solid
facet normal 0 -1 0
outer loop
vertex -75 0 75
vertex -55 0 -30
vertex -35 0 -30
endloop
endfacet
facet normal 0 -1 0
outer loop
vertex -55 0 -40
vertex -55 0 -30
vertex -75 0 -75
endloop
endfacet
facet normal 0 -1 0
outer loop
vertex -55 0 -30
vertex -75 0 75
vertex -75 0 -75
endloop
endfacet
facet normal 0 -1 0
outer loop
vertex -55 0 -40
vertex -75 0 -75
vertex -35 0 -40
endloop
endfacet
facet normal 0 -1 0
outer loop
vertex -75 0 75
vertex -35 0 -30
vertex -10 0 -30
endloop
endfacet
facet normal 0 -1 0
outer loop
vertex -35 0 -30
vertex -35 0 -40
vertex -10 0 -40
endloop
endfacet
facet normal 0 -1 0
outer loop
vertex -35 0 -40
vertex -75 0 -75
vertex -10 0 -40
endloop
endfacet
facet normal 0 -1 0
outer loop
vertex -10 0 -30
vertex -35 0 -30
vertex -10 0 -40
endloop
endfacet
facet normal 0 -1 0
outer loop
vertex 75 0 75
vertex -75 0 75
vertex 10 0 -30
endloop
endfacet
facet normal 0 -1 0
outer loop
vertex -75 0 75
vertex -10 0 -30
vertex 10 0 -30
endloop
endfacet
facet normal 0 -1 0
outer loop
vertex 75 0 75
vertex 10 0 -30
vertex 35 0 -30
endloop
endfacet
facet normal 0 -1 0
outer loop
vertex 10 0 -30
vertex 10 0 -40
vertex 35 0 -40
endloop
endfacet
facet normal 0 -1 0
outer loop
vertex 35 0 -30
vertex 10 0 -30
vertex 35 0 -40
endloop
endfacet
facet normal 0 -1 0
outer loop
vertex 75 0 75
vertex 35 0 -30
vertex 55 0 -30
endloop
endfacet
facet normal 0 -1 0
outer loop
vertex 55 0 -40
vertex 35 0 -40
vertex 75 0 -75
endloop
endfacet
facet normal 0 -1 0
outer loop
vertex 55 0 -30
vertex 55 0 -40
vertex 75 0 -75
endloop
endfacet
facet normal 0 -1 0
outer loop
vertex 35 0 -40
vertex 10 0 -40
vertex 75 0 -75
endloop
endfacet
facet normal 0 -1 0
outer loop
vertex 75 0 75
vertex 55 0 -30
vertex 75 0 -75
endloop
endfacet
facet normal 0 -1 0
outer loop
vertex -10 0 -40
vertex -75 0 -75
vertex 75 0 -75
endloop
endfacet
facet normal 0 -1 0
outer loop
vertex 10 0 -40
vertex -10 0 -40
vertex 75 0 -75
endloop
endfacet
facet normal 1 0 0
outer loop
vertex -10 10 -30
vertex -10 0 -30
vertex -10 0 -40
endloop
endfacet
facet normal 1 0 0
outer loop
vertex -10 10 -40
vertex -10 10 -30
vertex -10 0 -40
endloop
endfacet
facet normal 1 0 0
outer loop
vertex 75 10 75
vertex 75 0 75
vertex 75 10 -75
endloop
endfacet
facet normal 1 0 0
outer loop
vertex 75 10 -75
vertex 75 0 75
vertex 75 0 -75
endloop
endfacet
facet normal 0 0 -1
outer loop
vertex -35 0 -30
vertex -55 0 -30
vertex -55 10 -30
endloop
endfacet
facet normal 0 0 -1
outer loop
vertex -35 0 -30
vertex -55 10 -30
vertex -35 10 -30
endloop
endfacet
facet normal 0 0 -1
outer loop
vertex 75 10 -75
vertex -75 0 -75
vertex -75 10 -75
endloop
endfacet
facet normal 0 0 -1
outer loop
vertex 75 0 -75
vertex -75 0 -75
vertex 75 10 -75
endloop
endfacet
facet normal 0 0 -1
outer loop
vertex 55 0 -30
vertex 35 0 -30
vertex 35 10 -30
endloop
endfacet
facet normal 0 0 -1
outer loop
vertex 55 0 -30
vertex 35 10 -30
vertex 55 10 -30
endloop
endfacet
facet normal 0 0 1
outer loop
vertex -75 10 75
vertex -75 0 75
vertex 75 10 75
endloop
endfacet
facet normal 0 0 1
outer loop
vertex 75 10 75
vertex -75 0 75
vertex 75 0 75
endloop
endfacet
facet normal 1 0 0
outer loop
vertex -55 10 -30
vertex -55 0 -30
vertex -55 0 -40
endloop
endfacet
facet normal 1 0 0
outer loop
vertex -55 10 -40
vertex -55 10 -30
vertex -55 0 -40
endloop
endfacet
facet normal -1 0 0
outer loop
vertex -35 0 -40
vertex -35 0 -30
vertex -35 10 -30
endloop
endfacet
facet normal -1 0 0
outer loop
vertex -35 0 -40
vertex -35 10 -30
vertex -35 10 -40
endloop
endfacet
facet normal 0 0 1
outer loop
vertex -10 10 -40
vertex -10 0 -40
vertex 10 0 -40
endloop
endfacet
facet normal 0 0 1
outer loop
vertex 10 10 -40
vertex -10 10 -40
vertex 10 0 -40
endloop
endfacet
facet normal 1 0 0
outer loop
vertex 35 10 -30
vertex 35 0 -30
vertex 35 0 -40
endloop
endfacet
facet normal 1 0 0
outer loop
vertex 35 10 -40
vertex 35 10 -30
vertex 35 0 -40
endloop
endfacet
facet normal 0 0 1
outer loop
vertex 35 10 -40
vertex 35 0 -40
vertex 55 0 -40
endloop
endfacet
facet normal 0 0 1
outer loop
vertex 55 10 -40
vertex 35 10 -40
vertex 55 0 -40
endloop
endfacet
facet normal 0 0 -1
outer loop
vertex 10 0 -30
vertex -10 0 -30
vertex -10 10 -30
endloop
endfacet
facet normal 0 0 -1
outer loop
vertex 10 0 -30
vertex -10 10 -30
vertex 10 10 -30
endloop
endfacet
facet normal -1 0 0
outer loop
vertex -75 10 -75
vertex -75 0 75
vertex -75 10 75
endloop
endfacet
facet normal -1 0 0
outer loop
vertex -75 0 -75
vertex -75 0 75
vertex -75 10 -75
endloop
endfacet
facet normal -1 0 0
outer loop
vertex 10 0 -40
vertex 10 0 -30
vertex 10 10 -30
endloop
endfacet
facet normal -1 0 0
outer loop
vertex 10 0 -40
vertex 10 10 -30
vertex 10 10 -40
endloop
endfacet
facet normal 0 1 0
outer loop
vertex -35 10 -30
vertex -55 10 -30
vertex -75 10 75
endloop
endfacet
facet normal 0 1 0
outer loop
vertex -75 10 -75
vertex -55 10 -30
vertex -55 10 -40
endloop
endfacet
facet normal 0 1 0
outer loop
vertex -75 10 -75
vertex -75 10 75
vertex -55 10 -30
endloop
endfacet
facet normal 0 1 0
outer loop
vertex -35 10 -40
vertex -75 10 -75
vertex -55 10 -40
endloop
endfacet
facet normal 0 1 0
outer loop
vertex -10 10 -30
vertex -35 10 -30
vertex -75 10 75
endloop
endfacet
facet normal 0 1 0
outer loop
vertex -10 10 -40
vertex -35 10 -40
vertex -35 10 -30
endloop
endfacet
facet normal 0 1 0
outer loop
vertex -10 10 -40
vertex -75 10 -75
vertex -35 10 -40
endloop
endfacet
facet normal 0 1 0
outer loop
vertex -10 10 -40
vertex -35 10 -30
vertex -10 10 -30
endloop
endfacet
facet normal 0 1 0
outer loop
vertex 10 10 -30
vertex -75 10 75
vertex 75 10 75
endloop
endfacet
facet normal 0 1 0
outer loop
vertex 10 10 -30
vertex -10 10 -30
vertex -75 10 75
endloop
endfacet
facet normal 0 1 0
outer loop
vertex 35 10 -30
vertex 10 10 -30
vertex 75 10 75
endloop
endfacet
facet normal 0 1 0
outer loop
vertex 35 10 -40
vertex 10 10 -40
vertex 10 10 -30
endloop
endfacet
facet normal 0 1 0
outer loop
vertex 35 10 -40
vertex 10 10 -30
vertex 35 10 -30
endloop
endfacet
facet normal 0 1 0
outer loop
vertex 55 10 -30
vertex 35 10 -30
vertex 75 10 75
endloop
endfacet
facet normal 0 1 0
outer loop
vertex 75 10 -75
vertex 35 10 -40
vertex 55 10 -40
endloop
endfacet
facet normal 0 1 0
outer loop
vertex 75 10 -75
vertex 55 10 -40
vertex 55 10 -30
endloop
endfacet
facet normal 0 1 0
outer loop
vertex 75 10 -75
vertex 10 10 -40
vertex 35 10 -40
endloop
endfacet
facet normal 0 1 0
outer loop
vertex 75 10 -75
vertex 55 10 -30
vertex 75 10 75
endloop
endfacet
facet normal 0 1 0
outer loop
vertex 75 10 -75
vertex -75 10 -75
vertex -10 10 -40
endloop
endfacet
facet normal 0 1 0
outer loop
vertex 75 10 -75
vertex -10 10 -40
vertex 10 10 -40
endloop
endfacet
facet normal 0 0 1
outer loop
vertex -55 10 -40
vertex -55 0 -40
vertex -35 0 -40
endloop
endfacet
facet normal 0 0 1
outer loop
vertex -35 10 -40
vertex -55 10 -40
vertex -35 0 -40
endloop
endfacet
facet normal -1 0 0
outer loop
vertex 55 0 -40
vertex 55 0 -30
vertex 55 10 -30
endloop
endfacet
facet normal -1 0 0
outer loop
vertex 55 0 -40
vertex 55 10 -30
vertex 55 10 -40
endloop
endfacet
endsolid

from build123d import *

# Parameters (mm, degrees)
SKETCH1_W           = 150
SKETCH1_H           = 150
SKETCH1_W_2         = 20
SKETCH1_H_2         = 10
BOSS_EXTRUDE1_DEPTH = 10


with BuildPart() as part:
    # Sketch1 → Boss-Extrude1 (new body)
    with BuildSketch(Plane(origin=(0, 0, 0), x_dir=(1, 0, 0), z_dir=(0, 1, 0))):
        Rectangle(SKETCH1_W, SKETCH1_H)
        with Locations((-45, 35)):
            Rectangle(SKETCH1_W_2, SKETCH1_H_2, mode=Mode.SUBTRACT)
        with Locations((0, 35)):
            Rectangle(SKETCH1_W_2, SKETCH1_H_2, mode=Mode.SUBTRACT)
        with Locations((45, 35)):
            Rectangle(SKETCH1_W_2, SKETCH1_H_2, mode=Mode.SUBTRACT)
    extrude(amount=BOSS_EXTRUDE1_DEPTH)


solid = part.part
